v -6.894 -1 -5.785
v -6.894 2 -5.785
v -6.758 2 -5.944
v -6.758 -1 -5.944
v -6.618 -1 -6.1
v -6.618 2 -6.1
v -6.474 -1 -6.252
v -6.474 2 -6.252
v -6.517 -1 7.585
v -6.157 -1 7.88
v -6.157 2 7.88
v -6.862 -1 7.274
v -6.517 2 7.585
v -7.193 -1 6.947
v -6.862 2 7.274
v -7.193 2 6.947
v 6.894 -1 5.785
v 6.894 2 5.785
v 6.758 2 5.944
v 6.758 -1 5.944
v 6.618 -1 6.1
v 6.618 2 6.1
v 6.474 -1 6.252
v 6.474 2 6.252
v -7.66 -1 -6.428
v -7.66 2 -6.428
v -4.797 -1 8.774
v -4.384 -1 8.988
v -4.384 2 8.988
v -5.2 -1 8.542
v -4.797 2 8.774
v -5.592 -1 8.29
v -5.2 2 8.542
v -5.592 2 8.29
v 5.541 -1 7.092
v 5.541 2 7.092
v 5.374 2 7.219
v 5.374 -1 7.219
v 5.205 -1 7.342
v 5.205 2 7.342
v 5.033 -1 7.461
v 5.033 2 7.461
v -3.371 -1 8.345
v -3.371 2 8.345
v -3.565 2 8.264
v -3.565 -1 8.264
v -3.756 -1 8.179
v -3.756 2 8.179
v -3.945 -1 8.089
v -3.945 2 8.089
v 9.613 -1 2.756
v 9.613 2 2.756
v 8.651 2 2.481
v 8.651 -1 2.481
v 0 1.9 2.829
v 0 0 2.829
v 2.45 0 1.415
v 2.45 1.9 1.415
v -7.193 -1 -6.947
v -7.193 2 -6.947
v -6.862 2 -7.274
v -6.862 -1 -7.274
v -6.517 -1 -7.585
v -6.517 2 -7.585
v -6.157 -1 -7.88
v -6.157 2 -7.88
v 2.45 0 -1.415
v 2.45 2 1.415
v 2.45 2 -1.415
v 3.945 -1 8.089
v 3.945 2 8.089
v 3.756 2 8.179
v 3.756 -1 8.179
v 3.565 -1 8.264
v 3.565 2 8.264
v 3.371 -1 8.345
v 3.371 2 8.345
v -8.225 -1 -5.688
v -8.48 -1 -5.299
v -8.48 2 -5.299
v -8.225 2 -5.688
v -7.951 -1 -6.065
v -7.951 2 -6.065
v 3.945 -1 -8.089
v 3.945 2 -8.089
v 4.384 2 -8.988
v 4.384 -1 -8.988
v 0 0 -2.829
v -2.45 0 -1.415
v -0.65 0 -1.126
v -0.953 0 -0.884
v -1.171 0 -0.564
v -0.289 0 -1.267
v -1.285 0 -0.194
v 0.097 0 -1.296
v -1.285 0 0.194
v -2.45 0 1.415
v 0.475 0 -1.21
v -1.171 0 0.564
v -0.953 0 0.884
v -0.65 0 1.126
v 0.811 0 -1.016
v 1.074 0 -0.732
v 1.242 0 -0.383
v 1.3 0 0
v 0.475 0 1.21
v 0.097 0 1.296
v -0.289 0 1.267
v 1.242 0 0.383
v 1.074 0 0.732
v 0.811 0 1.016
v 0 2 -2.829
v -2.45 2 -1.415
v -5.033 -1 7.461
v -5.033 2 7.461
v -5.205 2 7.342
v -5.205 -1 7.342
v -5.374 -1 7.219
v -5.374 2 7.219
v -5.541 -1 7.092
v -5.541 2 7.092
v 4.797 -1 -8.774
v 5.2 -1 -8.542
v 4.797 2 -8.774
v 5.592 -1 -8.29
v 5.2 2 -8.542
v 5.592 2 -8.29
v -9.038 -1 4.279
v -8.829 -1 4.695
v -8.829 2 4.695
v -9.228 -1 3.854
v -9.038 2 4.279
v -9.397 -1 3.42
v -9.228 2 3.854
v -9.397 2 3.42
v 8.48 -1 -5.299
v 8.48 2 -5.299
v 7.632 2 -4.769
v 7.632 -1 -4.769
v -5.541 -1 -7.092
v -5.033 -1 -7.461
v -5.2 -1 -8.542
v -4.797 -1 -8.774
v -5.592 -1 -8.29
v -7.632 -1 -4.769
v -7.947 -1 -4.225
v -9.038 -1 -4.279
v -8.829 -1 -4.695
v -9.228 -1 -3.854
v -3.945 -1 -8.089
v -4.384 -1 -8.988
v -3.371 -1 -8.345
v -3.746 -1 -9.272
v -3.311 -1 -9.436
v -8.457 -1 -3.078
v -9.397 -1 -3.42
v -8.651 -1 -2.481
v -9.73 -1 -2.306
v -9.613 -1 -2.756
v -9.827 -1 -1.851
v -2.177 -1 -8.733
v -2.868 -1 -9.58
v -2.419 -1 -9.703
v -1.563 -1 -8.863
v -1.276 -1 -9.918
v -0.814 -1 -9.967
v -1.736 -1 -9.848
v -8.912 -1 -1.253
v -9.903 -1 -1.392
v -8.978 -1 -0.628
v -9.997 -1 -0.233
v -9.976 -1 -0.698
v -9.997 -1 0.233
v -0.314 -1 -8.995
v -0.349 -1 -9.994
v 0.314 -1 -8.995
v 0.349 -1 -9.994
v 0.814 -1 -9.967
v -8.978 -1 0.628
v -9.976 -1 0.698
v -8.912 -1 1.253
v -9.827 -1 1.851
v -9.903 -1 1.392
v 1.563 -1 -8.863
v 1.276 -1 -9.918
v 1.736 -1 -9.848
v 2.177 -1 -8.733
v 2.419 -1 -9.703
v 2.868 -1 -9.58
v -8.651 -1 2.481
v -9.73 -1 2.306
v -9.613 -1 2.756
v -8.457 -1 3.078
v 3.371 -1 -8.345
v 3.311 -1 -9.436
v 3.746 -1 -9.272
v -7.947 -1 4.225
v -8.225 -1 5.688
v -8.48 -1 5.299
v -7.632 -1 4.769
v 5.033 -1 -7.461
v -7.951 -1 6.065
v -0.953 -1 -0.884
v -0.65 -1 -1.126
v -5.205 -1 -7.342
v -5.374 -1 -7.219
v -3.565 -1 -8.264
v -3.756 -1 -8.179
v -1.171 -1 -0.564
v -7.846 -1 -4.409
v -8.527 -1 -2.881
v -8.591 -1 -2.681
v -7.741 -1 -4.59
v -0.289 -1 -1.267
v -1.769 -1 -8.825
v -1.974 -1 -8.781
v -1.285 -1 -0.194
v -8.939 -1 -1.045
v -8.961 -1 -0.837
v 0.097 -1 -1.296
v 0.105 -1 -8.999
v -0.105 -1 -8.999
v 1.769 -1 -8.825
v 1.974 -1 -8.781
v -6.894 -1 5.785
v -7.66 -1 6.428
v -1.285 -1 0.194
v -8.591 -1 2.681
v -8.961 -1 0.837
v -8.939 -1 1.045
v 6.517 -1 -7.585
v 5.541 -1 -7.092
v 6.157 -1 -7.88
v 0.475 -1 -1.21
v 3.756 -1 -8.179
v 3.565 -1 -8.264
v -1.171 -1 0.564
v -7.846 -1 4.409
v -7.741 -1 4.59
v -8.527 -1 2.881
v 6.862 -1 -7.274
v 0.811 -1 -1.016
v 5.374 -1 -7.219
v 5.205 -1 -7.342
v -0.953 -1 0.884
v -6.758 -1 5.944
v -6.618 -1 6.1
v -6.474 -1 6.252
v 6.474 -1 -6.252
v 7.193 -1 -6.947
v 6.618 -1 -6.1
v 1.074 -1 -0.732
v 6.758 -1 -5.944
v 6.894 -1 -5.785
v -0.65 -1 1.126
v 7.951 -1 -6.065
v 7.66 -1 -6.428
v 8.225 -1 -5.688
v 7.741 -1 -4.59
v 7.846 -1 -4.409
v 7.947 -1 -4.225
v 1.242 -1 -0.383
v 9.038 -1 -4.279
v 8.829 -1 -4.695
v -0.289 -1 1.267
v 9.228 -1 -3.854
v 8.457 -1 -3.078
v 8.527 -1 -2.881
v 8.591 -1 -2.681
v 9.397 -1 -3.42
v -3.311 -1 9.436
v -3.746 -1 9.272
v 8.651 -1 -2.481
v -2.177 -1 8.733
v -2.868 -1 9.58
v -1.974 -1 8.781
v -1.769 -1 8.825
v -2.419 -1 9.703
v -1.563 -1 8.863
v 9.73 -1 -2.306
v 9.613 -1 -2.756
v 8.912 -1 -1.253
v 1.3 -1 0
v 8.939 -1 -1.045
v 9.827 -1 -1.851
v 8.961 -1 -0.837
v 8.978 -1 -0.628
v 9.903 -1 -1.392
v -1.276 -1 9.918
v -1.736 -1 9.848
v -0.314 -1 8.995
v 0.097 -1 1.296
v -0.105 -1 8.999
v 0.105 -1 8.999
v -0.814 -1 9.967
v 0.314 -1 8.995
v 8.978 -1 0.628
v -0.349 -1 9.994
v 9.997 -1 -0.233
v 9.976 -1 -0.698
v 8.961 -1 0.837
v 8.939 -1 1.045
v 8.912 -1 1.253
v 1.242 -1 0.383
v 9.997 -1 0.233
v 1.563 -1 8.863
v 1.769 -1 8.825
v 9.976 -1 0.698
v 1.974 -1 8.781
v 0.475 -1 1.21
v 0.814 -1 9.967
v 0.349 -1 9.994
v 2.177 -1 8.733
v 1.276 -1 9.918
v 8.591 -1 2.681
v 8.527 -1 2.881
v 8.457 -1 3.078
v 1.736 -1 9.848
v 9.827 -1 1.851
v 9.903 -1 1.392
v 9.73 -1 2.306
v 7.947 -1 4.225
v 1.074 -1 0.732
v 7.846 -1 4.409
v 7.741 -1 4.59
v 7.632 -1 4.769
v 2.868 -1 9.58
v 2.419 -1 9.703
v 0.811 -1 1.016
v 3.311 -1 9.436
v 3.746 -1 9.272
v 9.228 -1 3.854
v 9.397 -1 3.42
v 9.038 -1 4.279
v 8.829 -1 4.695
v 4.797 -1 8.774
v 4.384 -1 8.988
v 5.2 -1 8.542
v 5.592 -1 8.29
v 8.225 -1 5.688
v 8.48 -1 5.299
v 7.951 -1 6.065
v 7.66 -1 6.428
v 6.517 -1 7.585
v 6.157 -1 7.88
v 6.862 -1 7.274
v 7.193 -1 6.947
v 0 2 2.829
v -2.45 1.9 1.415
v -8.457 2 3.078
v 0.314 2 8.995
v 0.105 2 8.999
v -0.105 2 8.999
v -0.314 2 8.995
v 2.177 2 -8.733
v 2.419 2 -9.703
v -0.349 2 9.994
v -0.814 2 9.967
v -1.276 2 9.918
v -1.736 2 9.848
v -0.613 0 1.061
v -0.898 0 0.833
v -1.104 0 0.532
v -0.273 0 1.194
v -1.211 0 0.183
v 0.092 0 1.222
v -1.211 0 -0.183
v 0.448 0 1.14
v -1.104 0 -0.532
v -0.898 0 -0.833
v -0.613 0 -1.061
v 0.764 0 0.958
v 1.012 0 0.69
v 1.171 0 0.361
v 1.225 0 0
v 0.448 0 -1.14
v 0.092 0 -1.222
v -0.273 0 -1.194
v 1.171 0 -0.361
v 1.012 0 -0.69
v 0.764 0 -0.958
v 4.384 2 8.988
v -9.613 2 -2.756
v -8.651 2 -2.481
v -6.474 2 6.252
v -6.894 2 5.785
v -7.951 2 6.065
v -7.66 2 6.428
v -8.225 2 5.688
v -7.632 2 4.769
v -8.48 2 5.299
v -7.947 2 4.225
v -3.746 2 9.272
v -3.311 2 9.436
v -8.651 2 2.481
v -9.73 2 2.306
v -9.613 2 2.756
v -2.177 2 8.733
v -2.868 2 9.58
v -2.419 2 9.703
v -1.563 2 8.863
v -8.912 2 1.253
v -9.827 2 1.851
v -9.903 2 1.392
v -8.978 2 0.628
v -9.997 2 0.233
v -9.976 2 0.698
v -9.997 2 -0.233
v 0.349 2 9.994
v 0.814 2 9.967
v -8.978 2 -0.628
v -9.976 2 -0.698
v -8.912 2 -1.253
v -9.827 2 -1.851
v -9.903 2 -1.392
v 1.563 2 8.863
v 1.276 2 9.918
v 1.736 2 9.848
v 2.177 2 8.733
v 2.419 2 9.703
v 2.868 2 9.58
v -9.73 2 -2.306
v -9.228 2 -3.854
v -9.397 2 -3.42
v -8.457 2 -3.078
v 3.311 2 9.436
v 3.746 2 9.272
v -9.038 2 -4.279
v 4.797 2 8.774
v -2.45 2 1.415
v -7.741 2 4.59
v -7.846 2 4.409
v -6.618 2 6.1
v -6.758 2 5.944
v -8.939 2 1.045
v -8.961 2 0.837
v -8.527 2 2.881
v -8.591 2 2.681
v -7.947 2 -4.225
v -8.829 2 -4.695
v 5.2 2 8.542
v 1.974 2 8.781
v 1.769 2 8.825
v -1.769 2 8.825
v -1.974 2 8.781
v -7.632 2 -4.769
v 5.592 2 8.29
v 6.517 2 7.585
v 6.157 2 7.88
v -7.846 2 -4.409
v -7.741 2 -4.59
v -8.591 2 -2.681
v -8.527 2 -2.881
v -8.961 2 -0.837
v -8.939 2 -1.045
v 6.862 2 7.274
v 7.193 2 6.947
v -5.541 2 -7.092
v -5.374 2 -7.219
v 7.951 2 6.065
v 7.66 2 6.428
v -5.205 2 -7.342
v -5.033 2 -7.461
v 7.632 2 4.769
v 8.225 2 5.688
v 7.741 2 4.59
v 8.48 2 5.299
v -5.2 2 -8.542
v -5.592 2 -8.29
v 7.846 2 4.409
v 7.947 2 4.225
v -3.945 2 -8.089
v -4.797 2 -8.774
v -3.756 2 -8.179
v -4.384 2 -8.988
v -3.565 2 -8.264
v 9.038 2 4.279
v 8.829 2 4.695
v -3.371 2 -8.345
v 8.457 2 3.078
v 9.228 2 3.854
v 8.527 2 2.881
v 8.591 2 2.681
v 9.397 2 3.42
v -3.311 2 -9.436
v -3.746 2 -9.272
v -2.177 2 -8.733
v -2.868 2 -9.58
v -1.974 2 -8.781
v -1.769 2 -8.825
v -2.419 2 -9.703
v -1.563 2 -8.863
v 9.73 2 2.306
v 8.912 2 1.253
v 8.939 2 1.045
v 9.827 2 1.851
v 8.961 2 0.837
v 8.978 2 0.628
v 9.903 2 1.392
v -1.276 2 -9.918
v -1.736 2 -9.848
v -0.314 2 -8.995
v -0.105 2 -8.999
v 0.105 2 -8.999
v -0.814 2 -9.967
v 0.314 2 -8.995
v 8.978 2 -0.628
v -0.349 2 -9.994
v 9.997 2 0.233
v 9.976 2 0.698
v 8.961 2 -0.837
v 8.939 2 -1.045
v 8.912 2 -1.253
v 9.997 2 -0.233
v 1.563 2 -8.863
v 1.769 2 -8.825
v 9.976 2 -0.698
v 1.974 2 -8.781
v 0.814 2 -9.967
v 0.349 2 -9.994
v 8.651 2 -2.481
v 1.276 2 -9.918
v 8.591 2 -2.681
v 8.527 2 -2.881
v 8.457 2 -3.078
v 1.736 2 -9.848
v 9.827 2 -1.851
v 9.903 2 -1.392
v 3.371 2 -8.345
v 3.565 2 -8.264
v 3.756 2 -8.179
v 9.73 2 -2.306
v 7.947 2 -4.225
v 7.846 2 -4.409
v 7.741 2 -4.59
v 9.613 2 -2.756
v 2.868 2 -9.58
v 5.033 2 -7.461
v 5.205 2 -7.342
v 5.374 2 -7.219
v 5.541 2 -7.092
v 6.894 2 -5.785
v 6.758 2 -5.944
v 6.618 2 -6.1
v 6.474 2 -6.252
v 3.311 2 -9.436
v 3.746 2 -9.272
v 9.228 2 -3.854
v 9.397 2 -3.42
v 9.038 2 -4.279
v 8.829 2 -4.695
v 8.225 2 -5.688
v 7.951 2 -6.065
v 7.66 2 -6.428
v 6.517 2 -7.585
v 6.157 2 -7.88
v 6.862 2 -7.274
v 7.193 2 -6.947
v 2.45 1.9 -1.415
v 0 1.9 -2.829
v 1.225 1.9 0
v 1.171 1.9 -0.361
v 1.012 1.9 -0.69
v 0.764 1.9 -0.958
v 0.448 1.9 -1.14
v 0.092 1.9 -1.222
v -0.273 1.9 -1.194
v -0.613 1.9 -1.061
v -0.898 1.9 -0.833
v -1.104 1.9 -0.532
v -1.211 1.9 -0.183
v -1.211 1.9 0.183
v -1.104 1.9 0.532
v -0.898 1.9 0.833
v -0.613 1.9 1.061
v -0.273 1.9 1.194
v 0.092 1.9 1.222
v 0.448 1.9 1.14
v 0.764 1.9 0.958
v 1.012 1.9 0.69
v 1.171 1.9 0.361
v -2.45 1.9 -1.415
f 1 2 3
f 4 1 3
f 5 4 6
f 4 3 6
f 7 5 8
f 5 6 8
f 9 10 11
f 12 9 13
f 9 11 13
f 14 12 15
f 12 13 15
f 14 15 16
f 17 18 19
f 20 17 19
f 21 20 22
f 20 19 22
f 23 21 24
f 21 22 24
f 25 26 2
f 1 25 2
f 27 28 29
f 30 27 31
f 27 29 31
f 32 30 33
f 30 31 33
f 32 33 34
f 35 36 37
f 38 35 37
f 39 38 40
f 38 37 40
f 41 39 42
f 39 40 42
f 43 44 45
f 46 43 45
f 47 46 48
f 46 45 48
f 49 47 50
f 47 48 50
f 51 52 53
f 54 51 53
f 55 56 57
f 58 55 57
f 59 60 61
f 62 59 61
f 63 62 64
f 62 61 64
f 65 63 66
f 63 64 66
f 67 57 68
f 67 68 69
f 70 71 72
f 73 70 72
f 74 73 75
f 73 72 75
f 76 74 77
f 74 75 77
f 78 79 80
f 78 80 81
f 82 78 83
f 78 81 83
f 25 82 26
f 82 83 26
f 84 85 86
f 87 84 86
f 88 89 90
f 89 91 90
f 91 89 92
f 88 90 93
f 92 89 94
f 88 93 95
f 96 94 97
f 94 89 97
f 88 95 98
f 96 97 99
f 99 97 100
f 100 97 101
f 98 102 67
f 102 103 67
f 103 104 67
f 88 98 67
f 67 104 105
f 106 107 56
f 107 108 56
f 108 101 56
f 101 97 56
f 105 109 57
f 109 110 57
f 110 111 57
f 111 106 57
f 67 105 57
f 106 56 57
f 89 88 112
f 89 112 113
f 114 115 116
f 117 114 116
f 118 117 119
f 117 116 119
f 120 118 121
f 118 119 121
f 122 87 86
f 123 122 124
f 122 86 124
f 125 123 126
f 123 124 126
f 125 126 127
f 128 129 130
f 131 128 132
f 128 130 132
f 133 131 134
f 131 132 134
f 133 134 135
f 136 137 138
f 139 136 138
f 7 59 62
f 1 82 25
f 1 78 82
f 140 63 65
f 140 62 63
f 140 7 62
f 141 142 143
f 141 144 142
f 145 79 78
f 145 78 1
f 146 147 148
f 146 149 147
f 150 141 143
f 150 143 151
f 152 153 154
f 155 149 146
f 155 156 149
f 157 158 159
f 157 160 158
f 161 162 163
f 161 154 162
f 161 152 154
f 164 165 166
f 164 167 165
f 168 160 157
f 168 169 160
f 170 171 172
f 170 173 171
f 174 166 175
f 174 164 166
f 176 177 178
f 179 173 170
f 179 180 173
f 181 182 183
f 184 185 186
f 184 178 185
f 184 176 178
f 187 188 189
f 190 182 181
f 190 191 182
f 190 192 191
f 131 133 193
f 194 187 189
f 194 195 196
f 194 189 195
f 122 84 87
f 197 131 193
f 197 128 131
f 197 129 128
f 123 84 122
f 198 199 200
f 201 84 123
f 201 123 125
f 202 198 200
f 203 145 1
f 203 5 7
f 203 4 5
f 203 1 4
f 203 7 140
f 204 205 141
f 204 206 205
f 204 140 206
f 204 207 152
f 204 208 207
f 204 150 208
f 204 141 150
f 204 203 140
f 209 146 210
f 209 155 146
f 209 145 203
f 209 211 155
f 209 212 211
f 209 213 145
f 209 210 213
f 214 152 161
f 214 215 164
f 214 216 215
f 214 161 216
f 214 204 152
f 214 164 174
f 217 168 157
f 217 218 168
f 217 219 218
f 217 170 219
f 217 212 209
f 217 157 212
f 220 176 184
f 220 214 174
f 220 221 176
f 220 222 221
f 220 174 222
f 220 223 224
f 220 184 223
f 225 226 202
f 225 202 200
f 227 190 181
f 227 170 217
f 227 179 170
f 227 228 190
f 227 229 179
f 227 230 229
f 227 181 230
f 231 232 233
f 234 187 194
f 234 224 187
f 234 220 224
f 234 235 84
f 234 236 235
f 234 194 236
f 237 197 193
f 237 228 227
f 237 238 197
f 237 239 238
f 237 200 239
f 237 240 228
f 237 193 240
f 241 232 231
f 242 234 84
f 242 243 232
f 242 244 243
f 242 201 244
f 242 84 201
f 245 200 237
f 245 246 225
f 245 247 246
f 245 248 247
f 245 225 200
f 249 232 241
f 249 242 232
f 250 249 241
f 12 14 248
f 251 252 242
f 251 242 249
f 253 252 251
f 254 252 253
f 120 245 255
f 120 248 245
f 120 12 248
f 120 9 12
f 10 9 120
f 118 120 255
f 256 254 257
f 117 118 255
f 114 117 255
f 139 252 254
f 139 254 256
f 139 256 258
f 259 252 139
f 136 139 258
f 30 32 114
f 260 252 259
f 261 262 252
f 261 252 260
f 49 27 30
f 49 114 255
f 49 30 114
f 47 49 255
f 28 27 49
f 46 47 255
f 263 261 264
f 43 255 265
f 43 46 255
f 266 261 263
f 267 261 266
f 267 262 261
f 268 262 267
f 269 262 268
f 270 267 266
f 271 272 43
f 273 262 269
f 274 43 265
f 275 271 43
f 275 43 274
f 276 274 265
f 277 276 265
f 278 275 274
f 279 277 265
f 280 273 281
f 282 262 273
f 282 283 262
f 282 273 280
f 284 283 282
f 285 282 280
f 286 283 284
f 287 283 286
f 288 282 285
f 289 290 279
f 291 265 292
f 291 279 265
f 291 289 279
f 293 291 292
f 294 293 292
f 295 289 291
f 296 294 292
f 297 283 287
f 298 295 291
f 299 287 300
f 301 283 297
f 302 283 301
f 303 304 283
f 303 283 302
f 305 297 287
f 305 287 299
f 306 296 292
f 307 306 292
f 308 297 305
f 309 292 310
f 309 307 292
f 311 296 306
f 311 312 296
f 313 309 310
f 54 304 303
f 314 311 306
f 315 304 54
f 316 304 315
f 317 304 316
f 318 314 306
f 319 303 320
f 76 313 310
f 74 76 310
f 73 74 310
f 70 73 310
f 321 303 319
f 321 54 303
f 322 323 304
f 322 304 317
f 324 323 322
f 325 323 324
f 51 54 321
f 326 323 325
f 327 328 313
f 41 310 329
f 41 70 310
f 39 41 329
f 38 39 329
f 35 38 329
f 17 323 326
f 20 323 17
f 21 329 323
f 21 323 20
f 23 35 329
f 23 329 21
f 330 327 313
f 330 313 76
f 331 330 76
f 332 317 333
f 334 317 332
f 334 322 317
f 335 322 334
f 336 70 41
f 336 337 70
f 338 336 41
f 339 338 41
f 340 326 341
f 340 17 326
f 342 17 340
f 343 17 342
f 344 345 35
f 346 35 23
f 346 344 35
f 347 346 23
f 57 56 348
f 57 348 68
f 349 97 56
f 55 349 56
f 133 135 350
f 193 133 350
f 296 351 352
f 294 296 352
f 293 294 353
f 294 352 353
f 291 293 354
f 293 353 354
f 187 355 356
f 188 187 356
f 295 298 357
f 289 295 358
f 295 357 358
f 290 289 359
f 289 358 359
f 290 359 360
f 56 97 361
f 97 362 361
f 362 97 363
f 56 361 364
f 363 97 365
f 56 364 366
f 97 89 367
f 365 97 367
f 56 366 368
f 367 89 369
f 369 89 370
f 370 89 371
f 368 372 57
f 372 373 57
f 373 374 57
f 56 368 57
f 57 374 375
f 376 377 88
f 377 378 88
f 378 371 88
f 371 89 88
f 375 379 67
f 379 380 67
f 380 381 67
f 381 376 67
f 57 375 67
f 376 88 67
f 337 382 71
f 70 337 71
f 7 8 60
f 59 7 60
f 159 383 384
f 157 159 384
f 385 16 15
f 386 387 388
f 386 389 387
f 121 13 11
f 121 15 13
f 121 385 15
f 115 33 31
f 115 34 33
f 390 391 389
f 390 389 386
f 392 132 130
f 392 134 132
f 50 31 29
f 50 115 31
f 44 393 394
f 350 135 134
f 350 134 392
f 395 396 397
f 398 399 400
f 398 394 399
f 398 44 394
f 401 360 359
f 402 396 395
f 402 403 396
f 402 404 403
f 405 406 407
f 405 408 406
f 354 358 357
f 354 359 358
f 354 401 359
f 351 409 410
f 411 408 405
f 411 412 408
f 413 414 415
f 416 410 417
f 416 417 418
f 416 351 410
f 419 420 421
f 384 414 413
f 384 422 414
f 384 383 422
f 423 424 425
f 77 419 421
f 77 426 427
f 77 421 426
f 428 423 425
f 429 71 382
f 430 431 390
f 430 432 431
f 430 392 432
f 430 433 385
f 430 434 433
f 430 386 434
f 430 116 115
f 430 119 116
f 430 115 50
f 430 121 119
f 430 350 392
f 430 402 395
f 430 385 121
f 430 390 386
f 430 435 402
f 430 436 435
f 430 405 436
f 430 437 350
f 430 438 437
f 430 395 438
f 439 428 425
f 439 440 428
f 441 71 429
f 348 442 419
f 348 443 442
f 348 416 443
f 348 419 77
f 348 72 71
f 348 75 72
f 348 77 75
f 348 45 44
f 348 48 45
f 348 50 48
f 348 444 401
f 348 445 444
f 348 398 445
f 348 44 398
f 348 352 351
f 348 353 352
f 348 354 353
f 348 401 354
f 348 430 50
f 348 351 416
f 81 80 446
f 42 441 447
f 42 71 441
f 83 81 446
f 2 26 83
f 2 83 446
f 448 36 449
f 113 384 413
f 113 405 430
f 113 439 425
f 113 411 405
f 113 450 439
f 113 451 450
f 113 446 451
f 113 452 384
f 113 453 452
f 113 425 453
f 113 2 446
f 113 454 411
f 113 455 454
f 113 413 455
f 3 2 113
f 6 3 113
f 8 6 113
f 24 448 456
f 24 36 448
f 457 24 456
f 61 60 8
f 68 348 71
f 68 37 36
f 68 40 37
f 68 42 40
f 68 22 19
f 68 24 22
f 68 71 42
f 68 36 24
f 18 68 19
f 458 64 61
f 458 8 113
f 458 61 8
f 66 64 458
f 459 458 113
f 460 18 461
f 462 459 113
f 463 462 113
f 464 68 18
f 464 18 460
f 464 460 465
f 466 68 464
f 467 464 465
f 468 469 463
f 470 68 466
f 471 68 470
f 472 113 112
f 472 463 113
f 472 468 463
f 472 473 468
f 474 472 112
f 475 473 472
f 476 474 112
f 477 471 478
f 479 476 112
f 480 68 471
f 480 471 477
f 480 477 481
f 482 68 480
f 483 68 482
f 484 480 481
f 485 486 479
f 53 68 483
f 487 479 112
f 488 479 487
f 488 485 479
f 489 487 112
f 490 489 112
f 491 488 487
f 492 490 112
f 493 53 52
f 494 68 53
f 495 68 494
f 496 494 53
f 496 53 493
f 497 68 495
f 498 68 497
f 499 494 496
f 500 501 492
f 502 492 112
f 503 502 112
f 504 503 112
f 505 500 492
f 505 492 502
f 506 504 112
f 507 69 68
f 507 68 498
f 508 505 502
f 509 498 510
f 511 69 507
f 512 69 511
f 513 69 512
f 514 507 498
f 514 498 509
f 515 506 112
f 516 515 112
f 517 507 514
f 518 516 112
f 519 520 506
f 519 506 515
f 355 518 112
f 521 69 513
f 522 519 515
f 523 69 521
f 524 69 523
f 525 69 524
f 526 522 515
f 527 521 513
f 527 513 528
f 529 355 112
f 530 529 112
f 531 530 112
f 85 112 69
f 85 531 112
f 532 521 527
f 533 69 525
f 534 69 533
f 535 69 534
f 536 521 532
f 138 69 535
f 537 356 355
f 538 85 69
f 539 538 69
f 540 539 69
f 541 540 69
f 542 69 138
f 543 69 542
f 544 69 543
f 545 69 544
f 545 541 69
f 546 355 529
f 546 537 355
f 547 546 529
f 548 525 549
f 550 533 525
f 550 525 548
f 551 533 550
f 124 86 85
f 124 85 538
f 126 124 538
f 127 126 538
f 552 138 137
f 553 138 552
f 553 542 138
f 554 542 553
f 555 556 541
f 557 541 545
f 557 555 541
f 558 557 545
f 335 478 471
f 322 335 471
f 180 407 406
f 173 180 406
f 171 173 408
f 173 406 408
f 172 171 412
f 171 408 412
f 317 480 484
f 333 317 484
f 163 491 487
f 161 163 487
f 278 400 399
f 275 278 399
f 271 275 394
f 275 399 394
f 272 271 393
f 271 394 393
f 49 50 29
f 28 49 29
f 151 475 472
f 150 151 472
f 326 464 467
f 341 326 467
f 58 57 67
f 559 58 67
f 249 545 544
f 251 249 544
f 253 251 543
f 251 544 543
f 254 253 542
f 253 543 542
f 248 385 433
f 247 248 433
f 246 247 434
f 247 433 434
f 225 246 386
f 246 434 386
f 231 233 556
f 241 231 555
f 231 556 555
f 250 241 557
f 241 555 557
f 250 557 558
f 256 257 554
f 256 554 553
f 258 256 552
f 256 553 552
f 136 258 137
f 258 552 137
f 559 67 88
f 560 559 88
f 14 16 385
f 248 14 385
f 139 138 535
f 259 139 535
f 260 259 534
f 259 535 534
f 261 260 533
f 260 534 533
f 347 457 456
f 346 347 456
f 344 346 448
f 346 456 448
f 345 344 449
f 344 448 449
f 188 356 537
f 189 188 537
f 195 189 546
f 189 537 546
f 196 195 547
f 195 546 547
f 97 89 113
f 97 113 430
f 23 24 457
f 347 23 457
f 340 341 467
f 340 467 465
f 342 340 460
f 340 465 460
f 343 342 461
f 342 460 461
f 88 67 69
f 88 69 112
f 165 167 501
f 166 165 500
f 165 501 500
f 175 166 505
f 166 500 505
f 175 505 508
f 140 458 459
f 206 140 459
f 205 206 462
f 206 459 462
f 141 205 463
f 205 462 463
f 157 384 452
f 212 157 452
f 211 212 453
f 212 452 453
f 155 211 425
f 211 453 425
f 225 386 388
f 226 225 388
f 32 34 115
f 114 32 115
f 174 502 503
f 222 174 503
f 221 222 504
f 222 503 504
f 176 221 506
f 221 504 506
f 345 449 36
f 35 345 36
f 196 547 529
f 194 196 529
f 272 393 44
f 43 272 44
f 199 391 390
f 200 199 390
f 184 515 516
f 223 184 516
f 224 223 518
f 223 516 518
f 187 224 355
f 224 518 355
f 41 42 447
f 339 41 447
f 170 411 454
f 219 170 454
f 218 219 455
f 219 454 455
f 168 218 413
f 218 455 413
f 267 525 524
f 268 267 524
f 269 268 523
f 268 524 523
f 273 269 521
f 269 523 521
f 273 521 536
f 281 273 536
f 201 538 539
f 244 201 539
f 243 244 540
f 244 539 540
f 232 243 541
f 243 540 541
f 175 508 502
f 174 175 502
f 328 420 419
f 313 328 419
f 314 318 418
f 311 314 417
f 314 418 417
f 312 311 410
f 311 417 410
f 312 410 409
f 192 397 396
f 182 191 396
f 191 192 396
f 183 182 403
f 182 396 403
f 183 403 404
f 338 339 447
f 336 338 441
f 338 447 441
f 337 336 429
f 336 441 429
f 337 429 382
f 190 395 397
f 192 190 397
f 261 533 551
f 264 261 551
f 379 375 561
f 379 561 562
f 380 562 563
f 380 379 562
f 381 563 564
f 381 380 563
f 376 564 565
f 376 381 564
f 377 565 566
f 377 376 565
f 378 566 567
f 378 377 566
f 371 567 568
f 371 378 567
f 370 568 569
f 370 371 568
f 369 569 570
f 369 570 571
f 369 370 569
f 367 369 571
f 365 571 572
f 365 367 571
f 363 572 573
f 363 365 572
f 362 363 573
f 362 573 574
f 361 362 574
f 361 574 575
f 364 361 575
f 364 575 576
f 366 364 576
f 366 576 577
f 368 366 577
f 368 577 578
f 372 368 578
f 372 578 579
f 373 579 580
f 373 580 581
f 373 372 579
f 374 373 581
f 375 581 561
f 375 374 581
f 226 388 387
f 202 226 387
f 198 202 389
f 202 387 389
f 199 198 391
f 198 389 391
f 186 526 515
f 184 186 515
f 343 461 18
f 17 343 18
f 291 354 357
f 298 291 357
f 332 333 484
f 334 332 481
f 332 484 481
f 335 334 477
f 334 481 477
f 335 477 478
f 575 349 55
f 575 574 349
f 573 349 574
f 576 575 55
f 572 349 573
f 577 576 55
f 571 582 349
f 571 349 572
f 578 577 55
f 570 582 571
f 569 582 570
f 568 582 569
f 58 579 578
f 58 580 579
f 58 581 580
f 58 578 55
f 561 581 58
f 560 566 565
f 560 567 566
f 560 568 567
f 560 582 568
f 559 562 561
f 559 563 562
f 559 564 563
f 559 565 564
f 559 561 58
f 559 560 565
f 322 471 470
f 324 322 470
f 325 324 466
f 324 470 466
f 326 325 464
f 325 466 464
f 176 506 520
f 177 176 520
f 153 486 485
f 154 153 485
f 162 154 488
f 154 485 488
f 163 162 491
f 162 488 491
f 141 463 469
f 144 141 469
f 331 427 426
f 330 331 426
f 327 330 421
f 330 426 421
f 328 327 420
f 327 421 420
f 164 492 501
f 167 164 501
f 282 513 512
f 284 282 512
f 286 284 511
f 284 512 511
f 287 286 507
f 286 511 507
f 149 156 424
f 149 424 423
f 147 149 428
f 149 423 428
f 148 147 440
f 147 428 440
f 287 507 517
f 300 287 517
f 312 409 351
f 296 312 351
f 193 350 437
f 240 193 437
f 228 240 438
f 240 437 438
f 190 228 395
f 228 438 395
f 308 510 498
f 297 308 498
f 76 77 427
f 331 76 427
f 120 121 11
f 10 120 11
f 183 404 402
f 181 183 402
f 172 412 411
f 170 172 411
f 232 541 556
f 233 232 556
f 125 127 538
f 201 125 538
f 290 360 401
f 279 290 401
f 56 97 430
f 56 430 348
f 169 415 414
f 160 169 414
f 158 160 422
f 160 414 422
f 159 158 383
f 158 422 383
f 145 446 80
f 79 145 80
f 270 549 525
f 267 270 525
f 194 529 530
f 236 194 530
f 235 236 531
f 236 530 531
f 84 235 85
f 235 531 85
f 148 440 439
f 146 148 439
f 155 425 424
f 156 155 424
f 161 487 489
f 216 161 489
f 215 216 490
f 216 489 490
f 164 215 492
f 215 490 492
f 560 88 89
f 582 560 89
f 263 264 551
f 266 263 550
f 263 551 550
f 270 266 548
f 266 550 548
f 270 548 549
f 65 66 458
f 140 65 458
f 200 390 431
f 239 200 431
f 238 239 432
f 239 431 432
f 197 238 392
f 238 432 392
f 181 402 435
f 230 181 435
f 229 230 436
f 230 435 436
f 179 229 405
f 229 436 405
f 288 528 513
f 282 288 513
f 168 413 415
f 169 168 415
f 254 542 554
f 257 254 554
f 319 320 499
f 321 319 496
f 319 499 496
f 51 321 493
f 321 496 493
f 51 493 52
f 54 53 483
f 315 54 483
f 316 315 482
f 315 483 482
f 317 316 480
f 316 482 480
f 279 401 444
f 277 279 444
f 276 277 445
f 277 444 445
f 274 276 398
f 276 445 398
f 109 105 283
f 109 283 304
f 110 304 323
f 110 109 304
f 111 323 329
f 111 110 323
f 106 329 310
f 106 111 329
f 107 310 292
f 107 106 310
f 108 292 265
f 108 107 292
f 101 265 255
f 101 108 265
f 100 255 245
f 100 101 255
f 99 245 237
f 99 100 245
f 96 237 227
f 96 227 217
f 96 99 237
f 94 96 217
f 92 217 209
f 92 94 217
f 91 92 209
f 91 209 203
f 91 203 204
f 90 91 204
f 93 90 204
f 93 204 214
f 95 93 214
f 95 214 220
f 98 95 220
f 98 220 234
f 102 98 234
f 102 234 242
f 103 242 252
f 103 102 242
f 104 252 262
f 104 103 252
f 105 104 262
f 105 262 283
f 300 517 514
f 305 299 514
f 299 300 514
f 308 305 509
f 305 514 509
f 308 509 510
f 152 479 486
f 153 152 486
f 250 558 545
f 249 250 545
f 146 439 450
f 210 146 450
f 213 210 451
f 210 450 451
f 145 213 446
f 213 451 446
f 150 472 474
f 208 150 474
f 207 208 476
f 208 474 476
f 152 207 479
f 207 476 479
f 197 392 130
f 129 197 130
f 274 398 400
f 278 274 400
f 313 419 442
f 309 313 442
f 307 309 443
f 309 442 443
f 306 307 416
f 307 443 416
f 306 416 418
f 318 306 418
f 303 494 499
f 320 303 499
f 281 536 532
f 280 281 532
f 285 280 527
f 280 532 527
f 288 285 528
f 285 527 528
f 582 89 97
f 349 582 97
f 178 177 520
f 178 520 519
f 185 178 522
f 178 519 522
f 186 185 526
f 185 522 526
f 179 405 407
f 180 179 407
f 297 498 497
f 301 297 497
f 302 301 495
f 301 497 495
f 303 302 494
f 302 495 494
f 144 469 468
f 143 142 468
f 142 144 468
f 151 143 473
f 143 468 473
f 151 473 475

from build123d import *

# Parameters (mm, degrees)
SKETCH1_R           = 1.225
BOSS_EXTRUDE1_DEPTH = 1.9
SKETCH2_R           = 10
BOSS_EXTRUDE2_DEPTH = 2
SKETCH3_R           = 10
SKETCH3_R_2         = 1.3
BOSS_EXTRUDE3_DEPTH = 1
CUT_EXTRUDE1_DEPTH  = 10
CIRPATTERN1_COUNT   = 30


with BuildPart() as part:
    # Sketch1 → Boss-Extrude1 (new body)
    with BuildSketch(Plane(origin=(0, 0, 0), x_dir=(1, 0, 0), z_dir=(0, 1, 0))):
        Polygon((0, -2.829016319), (2.45, -1.41450816), (2.45, 1.41450816), (0, 2.829016319), (-2.45, 1.41450816), (-2.45, -1.41450816), align=None)
        Circle(SKETCH1_R, mode=Mode.SUBTRACT)
    extrude(amount=BOSS_EXTRUDE1_DEPTH)


with BuildPart() as body_2:
    # Sketch2 → Boss-Extrude2 (new body)
    with BuildSketch(Plane(origin=(0, 0, 0), x_dir=(1, 0, 0), z_dir=(0, 1, 0))):
        Circle(SKETCH2_R)
        Polygon((-2.45, -1.41450816), (0, -2.829016319), (2.45, -1.41450816), (2.45, 1.41450816), (0, 2.829016319), (-2.45, 1.41450816), align=None, mode=Mode.SUBTRACT)
    extrude(amount=BOSS_EXTRUDE2_DEPTH)

    # Sketch3 → Boss-Extrude3 (add)
    with BuildSketch(Plane.XZ):
        Circle(SKETCH3_R)
        Circle(SKETCH3_R_2, mode=Mode.SUBTRACT)
    extrude(amount=BOSS_EXTRUDE3_DEPTH)

    # Sketch4 → Cut-Extrude1 (cut)
    with BuildSketch(Plane(origin=(0, 2, 0), x_dir=(1, 0, 0), z_dir=(0, 1, 0))):
        with BuildLine():
            ThreePointArc((0.31409547, -8.994517443), (0, -9), (-0.31409547, -8.994517443))
            Line((-0.31409547, -8.994517443), (-0.348994967, -9.99390827))
            Line((-0.348994967, -9.99390827), (-0.348994967, -10.651767424))
            Line((-0.348994967, -10.651767424), (0.348994967, -10.651767424))
            Line((0.348994967, -10.651767424), (0.348994967, -9.99390827))
            Line((0.348994967, -9.99390827), (0.31409547, -8.994517443))
        make_face()
    cut_extrude1 = extrude(amount=-CUT_EXTRUDE1_DEPTH, mode=Mode.SUBTRACT)

    # CirPattern1: Cut-Extrude1 ×30 about axis
    cirpattern1_axis = Axis((0, 0, 0), (0, 1, 0))
    for i in range(1, CIRPATTERN1_COUNT):
        add(cut_extrude1.rotate(cirpattern1_axis, i * 360 / CIRPATTERN1_COUNT), mode=Mode.SUBTRACT)


solid = Compound([part.part, body_2.part])
